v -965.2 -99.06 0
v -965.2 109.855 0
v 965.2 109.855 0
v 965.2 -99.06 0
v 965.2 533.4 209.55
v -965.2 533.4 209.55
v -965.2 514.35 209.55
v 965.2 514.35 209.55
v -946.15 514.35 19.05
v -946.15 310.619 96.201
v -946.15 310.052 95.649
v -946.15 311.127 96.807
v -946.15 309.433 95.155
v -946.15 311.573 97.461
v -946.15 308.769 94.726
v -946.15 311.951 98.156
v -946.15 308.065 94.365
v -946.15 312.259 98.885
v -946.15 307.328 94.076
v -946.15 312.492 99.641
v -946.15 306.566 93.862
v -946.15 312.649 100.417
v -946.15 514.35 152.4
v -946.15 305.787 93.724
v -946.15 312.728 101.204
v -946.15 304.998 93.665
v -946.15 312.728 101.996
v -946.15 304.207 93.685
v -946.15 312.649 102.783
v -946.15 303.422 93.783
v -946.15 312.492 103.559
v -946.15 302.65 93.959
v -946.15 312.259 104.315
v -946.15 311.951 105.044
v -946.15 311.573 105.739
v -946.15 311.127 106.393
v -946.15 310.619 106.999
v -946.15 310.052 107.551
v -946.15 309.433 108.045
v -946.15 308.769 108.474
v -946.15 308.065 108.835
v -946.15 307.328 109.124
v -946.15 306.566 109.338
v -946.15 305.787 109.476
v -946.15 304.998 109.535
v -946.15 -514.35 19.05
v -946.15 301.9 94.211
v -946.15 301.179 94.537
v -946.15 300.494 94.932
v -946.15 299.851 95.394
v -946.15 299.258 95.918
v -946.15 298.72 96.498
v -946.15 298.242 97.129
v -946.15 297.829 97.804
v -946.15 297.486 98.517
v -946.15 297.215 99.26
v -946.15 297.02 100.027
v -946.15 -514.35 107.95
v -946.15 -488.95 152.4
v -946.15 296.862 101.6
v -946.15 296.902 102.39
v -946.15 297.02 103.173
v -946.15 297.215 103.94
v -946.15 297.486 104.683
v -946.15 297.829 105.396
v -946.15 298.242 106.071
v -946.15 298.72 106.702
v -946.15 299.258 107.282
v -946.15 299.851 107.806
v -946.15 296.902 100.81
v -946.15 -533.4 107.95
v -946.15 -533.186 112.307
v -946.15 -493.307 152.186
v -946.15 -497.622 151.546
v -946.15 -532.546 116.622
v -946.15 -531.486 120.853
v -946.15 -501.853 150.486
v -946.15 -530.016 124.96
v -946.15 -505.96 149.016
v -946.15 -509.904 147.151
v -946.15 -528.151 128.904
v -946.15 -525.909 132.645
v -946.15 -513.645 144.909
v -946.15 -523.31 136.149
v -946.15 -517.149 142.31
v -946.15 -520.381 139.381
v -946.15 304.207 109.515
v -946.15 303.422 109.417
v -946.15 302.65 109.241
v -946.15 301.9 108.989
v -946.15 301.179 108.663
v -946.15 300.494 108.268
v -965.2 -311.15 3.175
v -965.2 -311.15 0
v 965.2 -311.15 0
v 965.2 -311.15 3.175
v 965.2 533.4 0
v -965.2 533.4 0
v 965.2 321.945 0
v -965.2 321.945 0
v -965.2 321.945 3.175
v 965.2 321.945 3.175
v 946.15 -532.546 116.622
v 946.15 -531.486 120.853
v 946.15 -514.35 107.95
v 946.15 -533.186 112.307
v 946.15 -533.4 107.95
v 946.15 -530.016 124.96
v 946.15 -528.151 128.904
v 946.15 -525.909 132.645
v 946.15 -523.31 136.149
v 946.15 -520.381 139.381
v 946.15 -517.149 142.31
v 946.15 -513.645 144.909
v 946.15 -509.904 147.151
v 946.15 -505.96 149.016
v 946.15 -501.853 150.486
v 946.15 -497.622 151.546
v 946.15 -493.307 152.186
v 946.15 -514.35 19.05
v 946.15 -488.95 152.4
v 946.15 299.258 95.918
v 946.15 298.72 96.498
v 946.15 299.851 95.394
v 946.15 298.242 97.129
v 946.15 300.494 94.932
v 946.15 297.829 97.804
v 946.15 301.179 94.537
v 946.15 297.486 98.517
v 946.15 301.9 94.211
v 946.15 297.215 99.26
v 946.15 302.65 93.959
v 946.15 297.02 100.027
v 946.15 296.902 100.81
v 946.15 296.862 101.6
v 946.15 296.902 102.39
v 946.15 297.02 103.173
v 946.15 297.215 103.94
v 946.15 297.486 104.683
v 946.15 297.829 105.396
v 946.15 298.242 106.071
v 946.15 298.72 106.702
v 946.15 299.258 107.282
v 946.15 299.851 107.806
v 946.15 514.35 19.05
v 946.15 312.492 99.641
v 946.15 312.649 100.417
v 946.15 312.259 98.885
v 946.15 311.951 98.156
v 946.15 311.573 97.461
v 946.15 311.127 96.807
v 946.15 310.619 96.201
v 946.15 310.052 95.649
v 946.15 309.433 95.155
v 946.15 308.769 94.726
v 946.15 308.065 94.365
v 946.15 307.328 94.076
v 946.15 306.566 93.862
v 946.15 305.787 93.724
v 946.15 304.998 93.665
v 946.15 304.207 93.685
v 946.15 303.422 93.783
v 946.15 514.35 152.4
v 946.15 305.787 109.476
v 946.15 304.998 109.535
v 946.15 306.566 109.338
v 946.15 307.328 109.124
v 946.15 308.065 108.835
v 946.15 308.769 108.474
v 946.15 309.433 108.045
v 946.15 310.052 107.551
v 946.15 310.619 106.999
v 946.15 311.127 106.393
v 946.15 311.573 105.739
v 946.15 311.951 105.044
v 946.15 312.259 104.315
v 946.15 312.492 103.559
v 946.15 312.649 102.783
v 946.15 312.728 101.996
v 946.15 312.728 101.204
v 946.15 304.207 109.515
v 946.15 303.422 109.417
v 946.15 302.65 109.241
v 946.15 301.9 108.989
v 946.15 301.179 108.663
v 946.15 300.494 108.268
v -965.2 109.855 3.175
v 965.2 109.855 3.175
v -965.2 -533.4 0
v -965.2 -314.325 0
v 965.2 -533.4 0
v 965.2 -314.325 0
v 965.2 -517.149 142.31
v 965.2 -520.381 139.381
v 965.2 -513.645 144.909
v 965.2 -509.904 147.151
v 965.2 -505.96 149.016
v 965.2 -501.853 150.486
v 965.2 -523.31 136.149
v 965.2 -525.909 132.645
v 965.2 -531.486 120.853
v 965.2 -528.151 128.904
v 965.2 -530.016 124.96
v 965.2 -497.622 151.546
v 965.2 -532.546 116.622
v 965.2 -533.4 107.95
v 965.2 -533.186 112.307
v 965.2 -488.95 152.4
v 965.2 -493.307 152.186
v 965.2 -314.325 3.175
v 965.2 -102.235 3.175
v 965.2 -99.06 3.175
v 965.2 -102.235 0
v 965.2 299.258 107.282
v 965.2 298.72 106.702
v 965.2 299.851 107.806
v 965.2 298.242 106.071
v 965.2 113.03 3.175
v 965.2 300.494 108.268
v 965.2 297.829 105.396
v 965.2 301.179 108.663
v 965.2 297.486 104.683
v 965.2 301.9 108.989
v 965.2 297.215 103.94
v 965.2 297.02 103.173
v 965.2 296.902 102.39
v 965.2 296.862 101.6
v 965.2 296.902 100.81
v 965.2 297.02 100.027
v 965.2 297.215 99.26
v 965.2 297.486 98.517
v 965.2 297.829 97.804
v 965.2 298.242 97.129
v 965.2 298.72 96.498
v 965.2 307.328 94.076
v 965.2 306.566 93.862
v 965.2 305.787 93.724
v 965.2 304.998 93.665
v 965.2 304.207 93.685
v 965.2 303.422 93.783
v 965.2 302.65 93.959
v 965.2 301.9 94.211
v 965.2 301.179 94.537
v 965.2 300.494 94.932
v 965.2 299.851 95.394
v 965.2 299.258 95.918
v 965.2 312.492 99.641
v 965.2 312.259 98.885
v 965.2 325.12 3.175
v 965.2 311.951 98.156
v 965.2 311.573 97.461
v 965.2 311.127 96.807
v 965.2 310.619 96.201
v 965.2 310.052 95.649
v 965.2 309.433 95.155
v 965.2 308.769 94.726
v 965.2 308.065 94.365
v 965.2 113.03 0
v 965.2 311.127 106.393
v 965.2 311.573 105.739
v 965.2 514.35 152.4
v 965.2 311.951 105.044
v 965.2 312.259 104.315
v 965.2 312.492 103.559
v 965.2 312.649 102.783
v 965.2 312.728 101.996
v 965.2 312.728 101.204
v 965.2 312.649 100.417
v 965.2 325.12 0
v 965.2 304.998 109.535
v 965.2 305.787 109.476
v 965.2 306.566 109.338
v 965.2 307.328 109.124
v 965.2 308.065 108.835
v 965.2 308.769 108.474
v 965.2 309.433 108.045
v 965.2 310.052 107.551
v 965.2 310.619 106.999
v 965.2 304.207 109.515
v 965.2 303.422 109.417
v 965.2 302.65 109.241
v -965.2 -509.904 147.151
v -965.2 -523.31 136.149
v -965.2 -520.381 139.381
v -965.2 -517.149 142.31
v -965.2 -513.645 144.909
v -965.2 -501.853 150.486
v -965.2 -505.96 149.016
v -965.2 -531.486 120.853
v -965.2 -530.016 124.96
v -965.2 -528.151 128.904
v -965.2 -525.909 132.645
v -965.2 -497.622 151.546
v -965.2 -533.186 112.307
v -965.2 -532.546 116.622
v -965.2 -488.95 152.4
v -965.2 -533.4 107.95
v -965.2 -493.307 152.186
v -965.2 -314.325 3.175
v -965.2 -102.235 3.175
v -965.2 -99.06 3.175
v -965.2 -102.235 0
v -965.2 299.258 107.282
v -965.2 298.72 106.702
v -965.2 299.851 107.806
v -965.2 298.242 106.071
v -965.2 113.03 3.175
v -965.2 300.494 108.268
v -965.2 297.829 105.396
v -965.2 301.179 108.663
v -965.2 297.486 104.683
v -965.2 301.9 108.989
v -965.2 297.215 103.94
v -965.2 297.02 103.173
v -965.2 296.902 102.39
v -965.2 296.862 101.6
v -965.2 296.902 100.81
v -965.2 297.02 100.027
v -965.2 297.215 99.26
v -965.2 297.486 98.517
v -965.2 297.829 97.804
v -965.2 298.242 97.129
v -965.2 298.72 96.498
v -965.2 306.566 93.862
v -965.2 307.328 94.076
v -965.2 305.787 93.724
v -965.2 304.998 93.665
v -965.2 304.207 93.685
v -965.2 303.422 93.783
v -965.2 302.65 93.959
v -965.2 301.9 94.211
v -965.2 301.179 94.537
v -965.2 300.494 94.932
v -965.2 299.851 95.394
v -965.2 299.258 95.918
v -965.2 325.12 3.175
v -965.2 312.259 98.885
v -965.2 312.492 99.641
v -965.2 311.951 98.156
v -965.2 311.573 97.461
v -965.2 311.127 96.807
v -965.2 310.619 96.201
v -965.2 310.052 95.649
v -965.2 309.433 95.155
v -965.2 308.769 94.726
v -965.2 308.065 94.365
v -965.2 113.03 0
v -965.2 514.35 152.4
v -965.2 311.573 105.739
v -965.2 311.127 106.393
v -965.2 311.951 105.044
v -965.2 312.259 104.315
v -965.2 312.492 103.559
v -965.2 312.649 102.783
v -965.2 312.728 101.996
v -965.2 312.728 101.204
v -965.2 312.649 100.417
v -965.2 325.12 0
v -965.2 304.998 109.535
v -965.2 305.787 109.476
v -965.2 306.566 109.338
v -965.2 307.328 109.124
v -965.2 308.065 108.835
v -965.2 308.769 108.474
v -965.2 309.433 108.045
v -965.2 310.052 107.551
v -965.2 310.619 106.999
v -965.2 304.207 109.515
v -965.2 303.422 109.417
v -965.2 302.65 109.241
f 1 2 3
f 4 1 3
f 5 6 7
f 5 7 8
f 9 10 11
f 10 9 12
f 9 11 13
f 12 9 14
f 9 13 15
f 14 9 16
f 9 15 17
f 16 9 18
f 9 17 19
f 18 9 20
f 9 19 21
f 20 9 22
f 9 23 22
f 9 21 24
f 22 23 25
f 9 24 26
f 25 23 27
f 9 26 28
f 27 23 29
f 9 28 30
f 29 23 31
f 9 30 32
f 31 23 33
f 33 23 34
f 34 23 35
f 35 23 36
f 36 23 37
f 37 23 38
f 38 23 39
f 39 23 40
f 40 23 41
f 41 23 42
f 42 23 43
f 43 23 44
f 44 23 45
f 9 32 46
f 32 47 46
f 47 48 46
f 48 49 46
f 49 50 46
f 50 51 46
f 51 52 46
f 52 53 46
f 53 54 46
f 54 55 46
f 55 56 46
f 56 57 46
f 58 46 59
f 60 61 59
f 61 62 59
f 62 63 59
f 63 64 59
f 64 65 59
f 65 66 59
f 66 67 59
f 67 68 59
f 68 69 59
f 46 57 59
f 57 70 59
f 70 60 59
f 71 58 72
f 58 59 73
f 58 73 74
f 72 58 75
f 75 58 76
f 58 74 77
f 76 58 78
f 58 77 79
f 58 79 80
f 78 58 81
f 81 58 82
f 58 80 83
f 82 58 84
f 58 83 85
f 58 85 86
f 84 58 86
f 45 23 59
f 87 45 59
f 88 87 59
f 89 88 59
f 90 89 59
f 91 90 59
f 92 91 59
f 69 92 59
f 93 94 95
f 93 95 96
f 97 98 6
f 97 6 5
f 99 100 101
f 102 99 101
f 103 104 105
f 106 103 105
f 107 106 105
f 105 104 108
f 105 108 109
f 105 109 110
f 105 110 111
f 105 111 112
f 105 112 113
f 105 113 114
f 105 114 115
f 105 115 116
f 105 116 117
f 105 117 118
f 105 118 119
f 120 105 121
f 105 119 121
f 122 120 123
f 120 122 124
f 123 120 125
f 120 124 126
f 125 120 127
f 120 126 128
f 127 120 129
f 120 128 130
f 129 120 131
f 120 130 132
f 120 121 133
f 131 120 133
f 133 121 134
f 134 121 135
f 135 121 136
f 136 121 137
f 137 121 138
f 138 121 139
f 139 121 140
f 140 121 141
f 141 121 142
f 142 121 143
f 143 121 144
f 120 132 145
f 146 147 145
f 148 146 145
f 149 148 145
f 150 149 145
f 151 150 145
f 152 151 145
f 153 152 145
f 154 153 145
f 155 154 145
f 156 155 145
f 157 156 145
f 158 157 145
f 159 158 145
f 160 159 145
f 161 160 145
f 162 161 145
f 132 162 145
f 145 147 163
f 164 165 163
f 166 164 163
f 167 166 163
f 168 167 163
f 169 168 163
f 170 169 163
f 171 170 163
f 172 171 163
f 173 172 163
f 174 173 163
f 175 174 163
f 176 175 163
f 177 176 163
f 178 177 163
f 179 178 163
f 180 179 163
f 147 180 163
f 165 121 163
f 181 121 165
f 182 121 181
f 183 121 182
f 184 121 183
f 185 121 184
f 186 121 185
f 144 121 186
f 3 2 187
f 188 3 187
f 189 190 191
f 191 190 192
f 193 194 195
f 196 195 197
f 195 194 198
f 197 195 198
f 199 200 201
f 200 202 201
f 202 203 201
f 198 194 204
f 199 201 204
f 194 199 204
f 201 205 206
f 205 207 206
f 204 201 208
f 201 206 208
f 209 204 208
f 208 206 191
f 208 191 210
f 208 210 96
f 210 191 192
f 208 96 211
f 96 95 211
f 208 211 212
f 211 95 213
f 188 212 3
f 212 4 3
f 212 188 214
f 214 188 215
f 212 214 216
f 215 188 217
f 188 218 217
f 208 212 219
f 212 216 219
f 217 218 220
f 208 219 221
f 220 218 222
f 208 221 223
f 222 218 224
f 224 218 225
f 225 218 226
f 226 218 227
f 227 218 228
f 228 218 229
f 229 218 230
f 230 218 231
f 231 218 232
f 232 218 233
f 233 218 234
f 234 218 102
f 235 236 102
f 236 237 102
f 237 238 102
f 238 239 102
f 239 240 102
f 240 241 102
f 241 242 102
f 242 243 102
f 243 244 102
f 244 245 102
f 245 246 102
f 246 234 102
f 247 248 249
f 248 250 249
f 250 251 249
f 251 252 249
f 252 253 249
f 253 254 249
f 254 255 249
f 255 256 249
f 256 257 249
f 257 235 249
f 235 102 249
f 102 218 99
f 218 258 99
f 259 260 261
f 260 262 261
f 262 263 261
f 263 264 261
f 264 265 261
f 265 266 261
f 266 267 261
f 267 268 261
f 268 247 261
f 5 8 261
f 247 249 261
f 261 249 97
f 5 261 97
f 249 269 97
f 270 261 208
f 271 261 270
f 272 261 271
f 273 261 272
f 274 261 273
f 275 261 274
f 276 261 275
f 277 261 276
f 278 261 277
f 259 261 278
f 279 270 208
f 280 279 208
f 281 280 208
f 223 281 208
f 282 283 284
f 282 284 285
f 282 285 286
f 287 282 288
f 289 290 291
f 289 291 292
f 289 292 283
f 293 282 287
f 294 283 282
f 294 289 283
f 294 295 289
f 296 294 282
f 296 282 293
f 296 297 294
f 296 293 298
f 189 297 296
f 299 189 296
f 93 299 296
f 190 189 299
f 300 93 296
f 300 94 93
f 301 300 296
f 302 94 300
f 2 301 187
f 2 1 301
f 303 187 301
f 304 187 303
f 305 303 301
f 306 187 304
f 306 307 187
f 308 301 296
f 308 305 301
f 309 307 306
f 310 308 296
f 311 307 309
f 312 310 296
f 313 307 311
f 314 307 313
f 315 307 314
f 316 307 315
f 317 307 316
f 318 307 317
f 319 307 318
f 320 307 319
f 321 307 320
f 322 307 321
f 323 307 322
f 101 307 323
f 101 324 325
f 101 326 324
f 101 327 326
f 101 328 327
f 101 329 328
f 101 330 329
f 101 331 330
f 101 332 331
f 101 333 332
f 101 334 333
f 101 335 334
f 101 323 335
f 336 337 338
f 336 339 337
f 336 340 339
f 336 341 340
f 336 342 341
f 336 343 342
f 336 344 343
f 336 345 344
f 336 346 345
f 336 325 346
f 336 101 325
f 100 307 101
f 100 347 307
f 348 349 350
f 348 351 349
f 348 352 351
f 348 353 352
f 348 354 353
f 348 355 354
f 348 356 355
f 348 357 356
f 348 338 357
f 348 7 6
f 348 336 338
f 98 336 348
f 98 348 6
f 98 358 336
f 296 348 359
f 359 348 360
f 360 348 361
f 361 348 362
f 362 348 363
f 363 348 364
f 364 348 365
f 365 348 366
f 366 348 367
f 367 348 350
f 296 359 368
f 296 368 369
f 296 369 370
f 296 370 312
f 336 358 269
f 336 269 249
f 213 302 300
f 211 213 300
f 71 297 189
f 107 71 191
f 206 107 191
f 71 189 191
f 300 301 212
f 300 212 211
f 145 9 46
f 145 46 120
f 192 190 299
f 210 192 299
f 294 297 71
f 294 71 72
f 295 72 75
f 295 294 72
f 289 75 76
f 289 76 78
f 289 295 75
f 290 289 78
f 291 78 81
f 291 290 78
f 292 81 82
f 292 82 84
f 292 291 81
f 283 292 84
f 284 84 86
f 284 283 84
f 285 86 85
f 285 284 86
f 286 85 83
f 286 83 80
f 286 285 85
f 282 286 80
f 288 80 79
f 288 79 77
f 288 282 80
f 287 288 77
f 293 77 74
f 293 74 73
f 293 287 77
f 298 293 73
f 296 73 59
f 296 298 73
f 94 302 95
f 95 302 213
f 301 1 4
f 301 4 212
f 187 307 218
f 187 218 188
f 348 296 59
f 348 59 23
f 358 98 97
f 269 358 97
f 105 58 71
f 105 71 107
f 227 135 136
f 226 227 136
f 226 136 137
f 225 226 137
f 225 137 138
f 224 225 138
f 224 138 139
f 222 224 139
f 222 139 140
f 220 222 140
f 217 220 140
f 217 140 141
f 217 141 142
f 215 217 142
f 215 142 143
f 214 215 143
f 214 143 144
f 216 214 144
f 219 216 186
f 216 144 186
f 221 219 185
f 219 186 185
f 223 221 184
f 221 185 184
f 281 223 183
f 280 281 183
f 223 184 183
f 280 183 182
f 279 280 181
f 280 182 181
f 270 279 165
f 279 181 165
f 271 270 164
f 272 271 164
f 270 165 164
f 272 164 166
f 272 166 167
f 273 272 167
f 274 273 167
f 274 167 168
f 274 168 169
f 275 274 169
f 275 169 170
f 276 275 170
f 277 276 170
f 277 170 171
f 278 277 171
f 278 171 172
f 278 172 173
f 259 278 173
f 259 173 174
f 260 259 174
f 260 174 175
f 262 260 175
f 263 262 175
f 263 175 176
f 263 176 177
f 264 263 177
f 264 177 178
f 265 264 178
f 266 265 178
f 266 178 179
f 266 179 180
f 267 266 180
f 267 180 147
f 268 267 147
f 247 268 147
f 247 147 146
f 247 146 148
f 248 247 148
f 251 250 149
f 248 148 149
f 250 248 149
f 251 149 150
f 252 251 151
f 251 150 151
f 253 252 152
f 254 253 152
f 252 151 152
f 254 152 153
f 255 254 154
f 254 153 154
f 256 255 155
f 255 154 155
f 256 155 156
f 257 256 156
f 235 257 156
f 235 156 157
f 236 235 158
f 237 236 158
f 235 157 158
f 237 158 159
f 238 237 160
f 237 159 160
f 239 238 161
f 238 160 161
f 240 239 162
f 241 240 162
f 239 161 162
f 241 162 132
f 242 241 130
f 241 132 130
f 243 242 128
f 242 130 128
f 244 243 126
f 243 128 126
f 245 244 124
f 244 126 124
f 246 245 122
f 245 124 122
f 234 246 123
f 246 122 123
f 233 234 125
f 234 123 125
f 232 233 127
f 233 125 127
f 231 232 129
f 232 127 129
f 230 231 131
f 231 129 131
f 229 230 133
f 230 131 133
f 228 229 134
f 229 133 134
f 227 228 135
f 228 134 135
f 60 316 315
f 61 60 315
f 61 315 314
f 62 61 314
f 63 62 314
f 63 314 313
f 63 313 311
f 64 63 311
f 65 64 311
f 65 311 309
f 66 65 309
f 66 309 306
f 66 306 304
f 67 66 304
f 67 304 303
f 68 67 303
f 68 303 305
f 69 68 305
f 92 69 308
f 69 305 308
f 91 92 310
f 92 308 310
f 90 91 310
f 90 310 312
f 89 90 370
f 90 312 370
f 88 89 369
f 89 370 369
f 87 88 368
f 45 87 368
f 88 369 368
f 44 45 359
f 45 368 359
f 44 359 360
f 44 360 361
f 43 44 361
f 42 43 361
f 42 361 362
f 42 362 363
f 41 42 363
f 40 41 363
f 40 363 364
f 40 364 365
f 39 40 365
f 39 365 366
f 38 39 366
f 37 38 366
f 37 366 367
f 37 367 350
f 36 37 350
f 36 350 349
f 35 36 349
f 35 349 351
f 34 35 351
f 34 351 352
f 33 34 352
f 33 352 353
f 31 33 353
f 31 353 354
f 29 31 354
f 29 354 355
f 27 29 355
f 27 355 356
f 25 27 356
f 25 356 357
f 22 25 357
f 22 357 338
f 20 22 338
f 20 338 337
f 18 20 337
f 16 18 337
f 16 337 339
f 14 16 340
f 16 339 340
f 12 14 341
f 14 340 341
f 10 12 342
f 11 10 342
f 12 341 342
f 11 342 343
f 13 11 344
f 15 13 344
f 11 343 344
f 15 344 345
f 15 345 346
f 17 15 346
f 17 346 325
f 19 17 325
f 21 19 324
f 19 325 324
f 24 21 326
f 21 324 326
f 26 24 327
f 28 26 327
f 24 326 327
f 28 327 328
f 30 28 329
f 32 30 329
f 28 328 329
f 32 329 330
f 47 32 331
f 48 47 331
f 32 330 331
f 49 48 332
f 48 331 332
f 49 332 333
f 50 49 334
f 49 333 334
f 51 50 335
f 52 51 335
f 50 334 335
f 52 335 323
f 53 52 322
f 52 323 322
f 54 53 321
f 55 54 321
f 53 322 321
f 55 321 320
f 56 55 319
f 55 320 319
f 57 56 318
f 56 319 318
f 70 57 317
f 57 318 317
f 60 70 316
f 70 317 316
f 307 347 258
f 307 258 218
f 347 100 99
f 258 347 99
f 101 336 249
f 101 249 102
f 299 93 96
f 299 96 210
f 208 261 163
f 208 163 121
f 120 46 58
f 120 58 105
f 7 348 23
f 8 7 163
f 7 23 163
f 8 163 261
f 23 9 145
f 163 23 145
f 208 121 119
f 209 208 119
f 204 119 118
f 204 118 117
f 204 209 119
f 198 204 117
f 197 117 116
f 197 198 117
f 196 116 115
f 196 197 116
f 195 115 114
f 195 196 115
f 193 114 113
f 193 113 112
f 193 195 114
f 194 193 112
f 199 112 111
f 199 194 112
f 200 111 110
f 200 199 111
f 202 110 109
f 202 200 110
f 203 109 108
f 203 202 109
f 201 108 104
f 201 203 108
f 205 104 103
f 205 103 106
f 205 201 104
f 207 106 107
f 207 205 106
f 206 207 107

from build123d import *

# Parameters (mm, degrees)
F0_W      = 1930.4
F0_H      = 1066.8
F1_DEPTH  = 19.05
F2_W      = 1930.4
F2_H      = 19.05
F3_DEPTH  = 88.9
F4_W      = 1930.4
F4_H      = 19.05
F5_DEPTH  = 190.5
F7_DEPTH  = 19.05
F9_DEPTH  = 19.05
F10_R     = 7.9375
F11_DEPTH = 1930.401
F12_W     = 3.175
F12_H     = 3.175
F13_DEPTH = 1930.4


with BuildPart() as f1:
    # F0 (on Top) → F1 (new body)
    with BuildSketch(Plane.XY):
        Rectangle(F0_W, F0_H)
    extrude(amount=F1_DEPTH)

    # F2 (on face) → F3 (join)
    with BuildSketch(Plane.XY.offset(19.05)):
        with Locations((0, -523.875)):
            Rectangle(F2_W, F2_H)
    extrude(amount=F3_DEPTH)

    # F4 (on face) → F5 (join)
    with BuildSketch(Plane.XY.offset(19.05)):
        with Locations((0, 523.875)):
            Rectangle(F4_W, F4_H)
    extrude(amount=F5_DEPTH)

    # F6 (on face) → F7 (join)
    with BuildSketch(Plane(origin=(-965.2, 0, 0), x_dir=(0, -1, 0), z_dir=(-1, 0, 0))):
        with BuildLine():
            Line((-533.4, 0), (533.4, 0))
            Line((533.4, 0), (533.4, 107.95))
            ThreePointArc((533.4, 107.95), (520.380896, 139.380896), (488.95, 152.4))
            Line((488.95, 152.4), (-533.4, 152.4))
            Line((-533.4, 152.4), (-533.4, 0))
        make_face()
    extrude(amount=-F7_DEPTH)

    # F8 (on face) → F9 (join)
    with BuildSketch(Plane.YZ.offset(965.2)):
        with BuildLine():
            Line((-533.4, 107.95), (-533.4, 0))
            Line((-533.4, 0), (533.4, 0))
            Line((533.4, 0), (533.4, 152.4))
            Line((533.4, 152.4), (-488.95, 152.4))
            ThreePointArc((-488.95, 152.4), (-520.380896, 139.380896), (-533.4, 107.95))
        make_face()
    extrude(amount=-F9_DEPTH)

    # F10 (on face) → F11 (cut, through all)
    with BuildSketch(Plane(origin=(-965.2, 0, 0), x_dir=(0, -1, 0), z_dir=(-1, 0, 0))):
        with Locations((-304.8, 101.6)):
            Circle(F10_R)
    extrude(amount=-F11_DEPTH, mode=Mode.SUBTRACT)

    # F12 (on face) → F13 (cut, through all)
    with BuildSketch(Plane(origin=(-965.2, 0, 0), x_dir=(0, -1, 0), z_dir=(-1, 0, 0))):
        with Locations((-323.5325, 1.5875)):
            Rectangle(F12_W, F12_H)
        with Locations((-111.4425, 1.5875)):
            Rectangle(F12_W, F12_H)
        with Locations((100.6475, 1.5875)):
            Rectangle(F12_W, F12_H)
        with Locations((312.7375, 1.5875)):
            Rectangle(F12_W, F12_H)
    extrude(amount=-F13_DEPTH, mode=Mode.SUBTRACT)


solid = f1.part
